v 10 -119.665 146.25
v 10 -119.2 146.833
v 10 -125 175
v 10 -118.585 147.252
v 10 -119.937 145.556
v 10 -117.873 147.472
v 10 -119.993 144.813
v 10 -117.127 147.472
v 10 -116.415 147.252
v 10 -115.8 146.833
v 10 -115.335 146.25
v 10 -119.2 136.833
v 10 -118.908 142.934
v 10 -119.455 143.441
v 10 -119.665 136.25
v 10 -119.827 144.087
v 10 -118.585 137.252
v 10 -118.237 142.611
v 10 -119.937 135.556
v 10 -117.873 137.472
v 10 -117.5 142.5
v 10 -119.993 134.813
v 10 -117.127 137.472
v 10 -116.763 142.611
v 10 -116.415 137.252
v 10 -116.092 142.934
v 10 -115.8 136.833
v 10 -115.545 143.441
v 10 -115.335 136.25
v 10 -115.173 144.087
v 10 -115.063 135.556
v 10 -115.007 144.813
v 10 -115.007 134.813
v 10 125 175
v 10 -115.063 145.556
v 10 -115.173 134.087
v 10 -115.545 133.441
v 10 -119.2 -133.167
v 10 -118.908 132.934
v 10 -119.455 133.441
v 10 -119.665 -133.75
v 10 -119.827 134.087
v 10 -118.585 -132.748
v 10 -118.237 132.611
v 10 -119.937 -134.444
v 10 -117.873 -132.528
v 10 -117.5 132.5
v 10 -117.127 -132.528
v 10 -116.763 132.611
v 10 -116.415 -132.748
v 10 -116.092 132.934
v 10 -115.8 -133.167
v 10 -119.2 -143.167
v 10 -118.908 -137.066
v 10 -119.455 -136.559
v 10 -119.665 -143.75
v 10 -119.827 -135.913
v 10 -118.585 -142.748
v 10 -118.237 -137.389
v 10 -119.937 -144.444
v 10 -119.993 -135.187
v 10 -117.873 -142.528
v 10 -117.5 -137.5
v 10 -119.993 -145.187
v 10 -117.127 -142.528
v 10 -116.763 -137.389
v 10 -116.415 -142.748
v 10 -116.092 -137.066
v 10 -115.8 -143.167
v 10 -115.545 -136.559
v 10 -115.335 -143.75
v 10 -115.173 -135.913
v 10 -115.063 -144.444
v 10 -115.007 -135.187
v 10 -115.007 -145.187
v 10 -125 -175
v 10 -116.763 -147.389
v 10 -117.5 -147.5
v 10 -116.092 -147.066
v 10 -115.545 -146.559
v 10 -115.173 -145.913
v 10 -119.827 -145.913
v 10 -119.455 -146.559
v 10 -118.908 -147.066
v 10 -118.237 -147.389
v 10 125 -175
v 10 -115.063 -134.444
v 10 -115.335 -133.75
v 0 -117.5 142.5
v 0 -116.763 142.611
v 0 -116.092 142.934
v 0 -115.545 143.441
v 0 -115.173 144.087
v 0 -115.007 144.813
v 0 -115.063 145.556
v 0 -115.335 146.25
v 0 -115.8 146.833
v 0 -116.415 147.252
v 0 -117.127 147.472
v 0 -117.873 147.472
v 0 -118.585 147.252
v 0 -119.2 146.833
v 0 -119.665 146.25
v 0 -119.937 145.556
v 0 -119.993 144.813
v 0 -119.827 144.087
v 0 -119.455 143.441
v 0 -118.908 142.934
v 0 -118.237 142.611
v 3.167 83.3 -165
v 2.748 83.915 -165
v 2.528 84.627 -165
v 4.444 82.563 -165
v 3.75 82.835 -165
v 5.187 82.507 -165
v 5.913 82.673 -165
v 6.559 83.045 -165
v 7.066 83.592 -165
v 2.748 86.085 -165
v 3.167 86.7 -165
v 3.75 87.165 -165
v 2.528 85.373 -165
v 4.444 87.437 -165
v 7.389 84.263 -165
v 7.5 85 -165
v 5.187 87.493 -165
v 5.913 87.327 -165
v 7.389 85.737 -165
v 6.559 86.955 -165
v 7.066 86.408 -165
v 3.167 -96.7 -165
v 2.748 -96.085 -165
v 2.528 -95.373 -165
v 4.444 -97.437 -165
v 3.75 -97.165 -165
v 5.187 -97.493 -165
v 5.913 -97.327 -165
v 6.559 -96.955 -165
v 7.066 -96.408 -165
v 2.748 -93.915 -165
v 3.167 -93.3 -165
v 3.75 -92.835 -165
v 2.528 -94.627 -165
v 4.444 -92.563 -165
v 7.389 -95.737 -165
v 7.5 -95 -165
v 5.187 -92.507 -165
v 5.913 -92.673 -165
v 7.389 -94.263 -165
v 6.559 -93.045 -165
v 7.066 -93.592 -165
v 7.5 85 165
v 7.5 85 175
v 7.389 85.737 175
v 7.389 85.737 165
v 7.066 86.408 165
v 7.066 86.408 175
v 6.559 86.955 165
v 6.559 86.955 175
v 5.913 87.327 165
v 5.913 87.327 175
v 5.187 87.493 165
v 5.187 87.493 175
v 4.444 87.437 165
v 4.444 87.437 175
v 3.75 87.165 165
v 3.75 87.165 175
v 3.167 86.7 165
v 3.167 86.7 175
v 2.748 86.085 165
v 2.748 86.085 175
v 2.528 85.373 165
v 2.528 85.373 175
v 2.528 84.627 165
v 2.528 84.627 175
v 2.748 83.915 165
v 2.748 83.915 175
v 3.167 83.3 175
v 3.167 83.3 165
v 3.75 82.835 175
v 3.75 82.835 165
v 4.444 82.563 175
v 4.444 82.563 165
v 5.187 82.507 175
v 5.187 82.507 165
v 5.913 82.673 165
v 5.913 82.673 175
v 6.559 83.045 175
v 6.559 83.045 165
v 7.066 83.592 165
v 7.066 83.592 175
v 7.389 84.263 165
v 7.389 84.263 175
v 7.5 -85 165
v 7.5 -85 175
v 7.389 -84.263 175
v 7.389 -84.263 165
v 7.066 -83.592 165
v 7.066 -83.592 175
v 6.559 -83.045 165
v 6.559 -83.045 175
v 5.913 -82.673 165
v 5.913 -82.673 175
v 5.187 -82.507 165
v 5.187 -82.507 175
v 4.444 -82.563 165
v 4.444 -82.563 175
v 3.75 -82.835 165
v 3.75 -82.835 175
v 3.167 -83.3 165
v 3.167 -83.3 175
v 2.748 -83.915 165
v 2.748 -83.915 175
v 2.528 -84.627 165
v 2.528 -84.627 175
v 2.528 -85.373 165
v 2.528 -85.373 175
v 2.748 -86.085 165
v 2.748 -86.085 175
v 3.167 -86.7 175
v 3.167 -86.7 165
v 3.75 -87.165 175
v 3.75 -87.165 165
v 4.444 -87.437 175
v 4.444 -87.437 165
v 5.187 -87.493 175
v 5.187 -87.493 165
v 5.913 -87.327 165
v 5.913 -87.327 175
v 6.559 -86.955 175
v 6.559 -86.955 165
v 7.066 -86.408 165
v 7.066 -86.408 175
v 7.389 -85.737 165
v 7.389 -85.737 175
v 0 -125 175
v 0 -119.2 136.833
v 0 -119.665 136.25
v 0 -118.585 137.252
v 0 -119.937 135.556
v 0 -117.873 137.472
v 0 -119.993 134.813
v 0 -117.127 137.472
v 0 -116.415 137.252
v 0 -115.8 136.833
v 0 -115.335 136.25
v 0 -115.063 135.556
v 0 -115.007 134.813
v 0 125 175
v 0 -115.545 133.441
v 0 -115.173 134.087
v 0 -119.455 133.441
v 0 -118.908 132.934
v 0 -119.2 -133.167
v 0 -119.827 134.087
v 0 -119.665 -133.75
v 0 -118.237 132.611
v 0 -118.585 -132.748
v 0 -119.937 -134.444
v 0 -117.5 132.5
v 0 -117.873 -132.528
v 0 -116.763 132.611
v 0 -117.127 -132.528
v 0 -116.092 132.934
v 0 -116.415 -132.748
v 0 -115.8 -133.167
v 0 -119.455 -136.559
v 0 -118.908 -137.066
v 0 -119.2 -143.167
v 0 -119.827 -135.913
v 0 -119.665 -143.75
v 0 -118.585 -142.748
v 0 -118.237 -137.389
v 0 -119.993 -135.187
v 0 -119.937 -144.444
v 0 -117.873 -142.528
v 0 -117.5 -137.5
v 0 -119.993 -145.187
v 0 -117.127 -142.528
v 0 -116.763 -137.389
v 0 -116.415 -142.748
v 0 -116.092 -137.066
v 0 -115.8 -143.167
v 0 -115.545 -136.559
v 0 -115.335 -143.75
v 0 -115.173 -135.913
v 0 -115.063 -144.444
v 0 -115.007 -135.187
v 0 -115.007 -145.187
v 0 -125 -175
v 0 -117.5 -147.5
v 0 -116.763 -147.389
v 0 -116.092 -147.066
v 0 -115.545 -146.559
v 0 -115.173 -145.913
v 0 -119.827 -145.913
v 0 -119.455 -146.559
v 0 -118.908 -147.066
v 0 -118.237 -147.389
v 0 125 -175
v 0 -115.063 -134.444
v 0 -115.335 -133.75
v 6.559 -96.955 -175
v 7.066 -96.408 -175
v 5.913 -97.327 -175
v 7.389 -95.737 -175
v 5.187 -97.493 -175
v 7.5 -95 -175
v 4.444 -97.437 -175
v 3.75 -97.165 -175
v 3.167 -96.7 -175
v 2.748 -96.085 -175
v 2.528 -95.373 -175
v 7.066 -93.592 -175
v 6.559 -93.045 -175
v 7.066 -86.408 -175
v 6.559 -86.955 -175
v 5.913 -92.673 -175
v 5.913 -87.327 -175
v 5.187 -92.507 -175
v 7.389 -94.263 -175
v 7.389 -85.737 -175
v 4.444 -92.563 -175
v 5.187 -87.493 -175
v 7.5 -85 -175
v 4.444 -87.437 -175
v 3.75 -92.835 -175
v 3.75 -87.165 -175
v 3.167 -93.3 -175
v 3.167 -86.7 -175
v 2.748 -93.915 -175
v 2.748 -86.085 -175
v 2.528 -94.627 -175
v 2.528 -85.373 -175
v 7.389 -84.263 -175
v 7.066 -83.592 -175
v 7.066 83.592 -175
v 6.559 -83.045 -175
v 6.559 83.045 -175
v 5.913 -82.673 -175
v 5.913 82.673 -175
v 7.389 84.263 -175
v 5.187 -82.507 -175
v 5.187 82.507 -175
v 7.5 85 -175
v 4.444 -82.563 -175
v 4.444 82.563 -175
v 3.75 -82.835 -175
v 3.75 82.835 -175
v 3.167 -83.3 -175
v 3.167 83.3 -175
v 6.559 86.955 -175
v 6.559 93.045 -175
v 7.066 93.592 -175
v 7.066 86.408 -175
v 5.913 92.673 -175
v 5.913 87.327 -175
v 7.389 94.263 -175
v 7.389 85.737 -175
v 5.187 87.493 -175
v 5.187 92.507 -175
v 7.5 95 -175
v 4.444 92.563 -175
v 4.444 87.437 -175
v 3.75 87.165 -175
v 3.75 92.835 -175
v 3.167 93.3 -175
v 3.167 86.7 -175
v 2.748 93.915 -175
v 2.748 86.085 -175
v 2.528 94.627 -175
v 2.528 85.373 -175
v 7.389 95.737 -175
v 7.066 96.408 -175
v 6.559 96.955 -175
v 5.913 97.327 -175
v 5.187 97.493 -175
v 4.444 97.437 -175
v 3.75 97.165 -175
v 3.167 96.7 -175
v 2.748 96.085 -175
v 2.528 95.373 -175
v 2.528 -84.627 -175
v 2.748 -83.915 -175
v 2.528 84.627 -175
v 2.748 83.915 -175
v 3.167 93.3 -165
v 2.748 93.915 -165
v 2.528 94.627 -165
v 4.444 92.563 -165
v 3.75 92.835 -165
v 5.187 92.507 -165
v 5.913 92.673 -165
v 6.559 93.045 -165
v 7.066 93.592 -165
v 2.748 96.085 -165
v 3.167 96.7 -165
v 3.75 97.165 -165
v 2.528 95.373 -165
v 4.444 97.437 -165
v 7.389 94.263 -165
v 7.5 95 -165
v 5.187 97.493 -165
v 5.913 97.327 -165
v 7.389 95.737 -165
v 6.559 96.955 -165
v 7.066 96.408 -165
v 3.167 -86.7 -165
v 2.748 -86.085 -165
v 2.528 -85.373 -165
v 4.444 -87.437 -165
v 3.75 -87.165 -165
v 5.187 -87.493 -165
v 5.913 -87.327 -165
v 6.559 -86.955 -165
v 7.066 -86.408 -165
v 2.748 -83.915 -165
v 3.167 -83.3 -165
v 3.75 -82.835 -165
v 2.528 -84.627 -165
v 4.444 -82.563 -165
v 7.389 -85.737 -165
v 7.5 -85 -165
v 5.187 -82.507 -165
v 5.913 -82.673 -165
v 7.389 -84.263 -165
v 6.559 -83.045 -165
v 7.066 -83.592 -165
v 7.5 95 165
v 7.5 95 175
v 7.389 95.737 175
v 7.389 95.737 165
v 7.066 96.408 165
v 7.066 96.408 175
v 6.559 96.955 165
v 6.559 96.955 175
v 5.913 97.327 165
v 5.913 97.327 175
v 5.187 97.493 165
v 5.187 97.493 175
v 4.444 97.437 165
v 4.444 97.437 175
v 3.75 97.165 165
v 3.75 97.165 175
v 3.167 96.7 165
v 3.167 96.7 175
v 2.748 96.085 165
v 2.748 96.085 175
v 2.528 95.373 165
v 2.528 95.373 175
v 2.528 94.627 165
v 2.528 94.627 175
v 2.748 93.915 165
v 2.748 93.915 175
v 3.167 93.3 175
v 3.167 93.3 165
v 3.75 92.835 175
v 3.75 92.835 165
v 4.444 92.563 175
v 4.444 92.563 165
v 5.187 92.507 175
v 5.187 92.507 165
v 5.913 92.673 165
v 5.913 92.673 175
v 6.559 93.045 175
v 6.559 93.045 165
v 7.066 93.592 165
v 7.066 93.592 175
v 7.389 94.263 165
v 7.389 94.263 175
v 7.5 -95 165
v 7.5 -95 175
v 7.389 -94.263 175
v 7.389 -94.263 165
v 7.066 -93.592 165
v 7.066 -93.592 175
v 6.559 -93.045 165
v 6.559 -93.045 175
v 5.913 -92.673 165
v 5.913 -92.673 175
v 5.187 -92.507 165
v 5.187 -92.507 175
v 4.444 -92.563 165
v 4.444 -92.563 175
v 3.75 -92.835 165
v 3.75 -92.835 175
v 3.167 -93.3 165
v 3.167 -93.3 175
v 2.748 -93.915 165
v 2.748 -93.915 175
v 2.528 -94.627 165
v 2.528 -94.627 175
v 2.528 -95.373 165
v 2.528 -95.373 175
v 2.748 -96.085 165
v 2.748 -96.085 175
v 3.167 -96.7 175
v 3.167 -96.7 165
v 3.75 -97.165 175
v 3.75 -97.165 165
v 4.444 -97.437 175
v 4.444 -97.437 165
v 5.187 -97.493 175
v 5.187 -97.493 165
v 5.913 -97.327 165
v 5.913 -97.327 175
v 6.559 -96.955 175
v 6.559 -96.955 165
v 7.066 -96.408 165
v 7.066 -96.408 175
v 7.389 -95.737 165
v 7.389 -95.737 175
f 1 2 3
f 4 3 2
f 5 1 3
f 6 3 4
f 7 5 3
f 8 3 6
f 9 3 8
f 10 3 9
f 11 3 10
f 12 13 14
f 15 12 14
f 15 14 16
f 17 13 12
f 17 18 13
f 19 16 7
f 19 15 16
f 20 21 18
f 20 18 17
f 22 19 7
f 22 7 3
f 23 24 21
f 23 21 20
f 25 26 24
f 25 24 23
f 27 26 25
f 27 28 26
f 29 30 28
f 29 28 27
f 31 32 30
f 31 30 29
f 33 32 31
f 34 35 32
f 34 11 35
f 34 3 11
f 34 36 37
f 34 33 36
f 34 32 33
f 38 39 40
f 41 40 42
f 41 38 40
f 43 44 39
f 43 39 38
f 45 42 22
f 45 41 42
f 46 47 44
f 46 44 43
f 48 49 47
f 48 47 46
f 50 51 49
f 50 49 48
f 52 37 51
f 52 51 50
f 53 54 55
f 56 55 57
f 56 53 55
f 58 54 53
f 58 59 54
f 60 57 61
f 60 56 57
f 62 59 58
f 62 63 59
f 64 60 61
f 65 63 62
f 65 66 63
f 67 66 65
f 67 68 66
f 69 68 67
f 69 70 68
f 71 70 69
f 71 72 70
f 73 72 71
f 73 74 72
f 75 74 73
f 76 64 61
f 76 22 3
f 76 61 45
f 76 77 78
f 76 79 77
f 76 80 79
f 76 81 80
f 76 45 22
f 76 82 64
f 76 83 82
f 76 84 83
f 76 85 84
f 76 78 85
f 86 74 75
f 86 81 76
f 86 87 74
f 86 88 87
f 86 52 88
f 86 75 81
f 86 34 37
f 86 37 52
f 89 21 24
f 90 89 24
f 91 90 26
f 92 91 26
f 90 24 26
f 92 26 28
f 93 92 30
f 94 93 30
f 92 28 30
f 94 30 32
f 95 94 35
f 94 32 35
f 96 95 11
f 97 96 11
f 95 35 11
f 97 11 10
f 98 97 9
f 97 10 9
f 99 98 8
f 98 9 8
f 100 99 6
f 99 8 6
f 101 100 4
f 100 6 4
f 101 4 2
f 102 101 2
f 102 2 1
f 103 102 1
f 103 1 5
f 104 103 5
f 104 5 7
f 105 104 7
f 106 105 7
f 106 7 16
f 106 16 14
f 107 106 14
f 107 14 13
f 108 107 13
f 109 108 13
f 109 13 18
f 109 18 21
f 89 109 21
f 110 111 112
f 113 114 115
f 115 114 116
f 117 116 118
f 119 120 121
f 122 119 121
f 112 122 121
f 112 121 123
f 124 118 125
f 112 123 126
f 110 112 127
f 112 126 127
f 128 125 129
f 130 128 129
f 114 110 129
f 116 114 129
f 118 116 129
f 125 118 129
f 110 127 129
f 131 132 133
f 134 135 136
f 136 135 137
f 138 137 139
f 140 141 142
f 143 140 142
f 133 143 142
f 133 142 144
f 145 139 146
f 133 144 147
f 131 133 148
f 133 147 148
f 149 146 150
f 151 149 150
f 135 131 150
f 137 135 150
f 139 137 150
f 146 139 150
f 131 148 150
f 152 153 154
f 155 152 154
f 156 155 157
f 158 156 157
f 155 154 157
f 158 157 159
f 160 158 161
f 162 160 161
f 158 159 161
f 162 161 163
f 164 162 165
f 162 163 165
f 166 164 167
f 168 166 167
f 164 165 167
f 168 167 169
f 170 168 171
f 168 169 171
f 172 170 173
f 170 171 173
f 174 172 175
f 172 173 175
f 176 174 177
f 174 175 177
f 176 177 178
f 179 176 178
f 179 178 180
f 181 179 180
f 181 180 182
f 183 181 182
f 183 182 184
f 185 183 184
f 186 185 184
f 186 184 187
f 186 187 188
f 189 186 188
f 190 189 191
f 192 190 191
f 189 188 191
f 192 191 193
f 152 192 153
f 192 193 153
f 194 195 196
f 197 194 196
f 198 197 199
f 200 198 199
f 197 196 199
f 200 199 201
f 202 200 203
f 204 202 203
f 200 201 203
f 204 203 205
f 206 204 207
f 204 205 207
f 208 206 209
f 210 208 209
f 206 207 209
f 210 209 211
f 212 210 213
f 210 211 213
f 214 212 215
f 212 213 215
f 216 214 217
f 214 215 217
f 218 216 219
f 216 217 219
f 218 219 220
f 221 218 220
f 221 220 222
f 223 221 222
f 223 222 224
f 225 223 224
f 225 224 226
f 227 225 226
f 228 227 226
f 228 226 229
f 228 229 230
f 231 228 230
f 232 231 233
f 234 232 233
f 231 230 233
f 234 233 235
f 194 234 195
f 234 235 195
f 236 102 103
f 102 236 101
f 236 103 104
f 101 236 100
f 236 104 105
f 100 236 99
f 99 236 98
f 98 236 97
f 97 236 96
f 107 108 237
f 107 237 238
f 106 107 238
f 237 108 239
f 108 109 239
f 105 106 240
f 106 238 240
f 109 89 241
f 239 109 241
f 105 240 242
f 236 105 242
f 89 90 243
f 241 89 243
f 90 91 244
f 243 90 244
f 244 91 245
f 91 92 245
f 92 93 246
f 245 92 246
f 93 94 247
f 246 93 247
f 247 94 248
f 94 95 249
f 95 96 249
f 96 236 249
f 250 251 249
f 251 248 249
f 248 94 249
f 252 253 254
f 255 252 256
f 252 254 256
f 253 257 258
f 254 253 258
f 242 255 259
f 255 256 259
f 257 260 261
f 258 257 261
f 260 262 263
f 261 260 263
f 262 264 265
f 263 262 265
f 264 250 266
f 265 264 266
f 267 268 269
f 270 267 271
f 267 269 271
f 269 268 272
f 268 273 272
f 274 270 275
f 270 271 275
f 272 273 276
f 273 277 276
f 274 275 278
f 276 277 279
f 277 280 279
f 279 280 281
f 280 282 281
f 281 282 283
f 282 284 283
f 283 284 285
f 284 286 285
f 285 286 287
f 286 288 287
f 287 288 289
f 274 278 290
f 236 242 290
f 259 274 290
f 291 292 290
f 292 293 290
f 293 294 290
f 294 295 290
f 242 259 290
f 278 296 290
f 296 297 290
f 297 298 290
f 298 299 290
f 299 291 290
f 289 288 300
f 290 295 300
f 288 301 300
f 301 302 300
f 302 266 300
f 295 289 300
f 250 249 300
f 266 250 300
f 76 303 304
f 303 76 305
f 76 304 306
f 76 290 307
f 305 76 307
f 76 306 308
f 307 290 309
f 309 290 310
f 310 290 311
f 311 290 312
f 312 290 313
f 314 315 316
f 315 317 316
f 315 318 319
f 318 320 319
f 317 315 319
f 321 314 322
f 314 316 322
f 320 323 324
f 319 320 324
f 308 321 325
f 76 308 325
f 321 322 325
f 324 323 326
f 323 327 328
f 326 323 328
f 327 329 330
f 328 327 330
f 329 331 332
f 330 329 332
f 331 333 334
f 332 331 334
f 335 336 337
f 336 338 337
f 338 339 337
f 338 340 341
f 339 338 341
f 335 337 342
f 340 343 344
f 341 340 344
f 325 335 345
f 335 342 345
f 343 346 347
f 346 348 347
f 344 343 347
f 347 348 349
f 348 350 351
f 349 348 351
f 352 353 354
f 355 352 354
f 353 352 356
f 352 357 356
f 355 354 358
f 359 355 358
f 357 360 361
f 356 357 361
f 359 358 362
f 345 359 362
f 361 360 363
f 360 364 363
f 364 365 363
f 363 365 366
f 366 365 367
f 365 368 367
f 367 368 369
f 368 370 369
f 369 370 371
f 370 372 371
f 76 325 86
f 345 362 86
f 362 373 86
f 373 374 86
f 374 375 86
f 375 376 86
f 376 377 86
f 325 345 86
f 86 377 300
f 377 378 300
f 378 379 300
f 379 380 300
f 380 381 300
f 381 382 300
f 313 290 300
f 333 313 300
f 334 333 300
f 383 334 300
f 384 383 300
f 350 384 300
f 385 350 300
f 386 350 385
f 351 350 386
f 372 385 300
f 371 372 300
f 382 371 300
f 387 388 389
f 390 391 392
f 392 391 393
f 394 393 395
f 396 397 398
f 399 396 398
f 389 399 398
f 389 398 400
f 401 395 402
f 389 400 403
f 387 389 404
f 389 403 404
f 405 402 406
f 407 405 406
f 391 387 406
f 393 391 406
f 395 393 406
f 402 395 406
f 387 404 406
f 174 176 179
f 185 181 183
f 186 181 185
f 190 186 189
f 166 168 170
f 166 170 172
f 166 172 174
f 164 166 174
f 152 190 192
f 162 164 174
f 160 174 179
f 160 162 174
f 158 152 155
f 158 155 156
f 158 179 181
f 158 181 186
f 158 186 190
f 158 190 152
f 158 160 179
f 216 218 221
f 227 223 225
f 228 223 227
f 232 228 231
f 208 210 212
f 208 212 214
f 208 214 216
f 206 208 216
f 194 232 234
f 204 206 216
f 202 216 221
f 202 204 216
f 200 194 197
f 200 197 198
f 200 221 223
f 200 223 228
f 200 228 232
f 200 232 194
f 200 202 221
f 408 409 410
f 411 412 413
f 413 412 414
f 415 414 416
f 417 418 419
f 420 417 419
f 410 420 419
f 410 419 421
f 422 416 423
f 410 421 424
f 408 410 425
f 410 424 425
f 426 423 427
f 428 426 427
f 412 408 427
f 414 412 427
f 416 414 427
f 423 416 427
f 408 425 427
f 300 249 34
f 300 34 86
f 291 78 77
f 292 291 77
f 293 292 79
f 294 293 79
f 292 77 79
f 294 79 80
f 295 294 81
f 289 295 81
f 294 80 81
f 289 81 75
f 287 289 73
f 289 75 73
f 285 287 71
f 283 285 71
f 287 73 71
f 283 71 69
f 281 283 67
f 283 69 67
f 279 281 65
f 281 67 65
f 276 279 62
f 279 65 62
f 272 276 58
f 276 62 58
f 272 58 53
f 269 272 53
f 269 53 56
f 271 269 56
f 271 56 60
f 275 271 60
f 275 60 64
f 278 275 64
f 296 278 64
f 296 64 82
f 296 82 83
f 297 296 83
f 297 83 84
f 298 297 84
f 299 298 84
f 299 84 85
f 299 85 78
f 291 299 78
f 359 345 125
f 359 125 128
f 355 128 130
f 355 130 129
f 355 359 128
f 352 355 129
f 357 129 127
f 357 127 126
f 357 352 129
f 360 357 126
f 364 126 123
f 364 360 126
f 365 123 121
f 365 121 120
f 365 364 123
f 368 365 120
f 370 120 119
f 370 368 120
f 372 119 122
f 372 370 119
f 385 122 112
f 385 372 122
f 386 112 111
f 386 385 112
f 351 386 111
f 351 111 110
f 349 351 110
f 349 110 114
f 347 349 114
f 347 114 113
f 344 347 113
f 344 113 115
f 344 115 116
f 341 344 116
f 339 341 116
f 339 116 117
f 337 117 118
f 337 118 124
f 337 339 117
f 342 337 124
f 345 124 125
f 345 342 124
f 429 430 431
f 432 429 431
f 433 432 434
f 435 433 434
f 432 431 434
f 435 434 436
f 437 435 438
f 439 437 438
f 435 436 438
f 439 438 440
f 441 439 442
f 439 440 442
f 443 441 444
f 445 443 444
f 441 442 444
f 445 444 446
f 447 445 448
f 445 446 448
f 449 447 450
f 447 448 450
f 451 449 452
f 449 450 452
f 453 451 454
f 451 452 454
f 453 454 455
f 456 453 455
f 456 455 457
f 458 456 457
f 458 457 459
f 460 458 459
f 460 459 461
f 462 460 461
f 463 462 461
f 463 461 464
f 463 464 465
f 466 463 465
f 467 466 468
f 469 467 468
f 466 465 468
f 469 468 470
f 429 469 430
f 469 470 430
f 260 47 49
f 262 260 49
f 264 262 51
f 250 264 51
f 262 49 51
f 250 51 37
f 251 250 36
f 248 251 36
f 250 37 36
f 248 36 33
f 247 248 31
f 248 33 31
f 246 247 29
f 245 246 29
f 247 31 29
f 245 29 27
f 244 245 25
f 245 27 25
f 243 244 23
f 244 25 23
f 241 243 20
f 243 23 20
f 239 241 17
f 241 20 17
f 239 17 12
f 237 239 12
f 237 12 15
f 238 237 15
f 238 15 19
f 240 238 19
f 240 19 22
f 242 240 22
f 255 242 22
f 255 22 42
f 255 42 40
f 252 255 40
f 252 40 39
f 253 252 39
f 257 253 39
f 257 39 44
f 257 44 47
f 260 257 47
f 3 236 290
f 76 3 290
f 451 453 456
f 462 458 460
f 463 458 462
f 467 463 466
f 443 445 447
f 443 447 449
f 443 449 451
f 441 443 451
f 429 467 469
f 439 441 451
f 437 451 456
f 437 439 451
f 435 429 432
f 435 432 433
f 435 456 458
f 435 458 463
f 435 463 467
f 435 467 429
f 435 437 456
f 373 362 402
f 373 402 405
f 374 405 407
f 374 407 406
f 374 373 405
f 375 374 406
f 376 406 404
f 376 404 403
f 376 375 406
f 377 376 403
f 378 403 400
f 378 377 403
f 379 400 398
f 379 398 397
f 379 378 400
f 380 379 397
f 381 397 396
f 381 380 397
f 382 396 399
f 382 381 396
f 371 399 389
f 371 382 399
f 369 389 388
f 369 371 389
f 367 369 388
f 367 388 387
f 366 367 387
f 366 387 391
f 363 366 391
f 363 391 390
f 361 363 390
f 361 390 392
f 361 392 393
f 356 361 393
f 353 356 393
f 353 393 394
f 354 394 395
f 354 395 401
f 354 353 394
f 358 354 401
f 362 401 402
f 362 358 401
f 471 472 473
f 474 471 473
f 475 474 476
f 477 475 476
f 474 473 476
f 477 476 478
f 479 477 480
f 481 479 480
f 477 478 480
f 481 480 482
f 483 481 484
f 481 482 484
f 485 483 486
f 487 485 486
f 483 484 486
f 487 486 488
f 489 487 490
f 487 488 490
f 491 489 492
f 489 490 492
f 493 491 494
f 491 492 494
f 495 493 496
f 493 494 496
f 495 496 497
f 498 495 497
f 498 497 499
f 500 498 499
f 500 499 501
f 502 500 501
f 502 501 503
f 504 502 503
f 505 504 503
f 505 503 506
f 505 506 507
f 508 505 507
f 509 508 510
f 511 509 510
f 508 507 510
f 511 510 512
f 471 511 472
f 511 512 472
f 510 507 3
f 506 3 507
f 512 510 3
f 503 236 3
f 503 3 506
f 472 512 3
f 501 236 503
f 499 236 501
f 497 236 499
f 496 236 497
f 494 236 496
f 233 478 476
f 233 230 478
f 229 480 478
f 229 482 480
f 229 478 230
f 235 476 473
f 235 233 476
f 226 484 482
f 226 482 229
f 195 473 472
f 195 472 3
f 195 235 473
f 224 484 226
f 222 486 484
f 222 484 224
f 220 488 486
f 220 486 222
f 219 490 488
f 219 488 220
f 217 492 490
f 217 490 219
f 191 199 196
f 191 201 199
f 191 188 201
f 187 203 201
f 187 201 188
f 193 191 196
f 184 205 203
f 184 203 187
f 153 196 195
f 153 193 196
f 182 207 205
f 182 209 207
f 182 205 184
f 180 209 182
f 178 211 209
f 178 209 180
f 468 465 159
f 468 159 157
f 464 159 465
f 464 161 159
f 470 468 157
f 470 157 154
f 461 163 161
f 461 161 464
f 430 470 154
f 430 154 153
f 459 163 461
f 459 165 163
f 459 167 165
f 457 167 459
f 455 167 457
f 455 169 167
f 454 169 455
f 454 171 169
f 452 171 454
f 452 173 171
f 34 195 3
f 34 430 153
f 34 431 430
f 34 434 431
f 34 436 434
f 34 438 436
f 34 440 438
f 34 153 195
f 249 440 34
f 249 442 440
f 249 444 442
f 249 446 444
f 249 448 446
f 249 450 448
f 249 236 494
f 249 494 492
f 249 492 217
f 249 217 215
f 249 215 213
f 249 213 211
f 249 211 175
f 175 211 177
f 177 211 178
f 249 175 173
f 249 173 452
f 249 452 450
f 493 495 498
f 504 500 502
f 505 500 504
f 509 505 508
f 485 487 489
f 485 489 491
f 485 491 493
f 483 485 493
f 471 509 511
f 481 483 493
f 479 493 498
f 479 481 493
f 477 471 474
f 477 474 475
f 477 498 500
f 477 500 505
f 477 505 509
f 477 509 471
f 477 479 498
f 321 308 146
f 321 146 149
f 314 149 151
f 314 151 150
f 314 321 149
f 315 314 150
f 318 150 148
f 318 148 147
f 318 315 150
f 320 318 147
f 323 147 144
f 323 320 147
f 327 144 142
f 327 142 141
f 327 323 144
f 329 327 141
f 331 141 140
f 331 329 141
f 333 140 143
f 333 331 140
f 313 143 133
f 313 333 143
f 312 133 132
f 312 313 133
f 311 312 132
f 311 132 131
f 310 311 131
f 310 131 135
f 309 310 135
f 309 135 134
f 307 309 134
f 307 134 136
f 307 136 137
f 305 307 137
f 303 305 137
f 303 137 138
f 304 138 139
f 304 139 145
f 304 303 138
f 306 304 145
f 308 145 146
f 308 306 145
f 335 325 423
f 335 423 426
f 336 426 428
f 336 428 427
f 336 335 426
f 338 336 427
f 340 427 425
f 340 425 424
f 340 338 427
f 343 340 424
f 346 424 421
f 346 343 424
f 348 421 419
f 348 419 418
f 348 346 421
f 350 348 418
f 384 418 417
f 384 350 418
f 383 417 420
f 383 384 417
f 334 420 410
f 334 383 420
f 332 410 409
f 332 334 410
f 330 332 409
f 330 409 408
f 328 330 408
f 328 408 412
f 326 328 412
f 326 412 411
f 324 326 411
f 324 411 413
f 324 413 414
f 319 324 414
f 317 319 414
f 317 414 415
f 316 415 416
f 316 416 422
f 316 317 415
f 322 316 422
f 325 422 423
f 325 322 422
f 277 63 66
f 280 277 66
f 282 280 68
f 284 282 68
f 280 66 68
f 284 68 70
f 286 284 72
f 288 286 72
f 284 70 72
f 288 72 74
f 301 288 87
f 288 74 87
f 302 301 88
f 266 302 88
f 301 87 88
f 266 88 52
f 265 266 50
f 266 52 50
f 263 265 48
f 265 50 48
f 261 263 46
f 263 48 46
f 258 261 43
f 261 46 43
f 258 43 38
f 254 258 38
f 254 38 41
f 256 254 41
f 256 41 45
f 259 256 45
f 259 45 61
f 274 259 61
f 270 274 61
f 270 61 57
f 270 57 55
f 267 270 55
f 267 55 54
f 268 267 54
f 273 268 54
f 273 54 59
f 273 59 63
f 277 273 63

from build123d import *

# Parameters (mm, degrees)
SKETCH1_W           = 350
SKETCH1_H           = 250
BOSS_EXTRUDE1_DEPTH = 10
SKETCH2_R           = 2.5
CUT_EXTRUDE1_DEPTH  = 10
SKETCH3_R           = 2.5
CUT_EXTRUDE2_DEPTH  = 216.290501416


with BuildPart() as part:
    # Sketch1 → Boss-Extrude1 (new body)
    with BuildSketch(Plane(origin=(0, 0, 0), x_dir=(0, 0, -1), z_dir=(1, 0, 0))):
        Rectangle(SKETCH1_W, SKETCH1_H)
    extrude(amount=BOSS_EXTRUDE1_DEPTH)

    # Sketch2 → Cut-Extrude1 (cut)
    with BuildSketch(Plane.XY.offset(175)):
        with Locations((5, 95)):
            Circle(SKETCH2_R)
        with Locations((5, 85)):
            Circle(SKETCH2_R)
        with Locations((5, -85)):
            Circle(SKETCH2_R)
        with Locations((5, -95)):
            Circle(SKETCH2_R)
    cut_extrude1 = extrude(amount=-CUT_EXTRUDE1_DEPTH, mode=Mode.SUBTRACT)

    # Mirror1: Cut-Extrude1 across plane
    add(cut_extrude1.mirror(Plane.XY), mode=Mode.SUBTRACT)

    # Sketch3 → Cut-Extrude2 (cut, through all)
    with BuildSketch(Plane(origin=(10, 0, 0), x_dir=(0, 0, -1), z_dir=(1, 0, 0))):
        with Locations((-145, -117.5)):
            Circle(SKETCH3_R)
        with Locations((-135, -117.5)):
            Circle(SKETCH3_R)
        with Locations((135, -117.5)):
            Circle(SKETCH3_R)
        with Locations((145, -117.5)):
            Circle(SKETCH3_R)
    extrude(amount=-CUT_EXTRUDE2_DEPTH, mode=Mode.SUBTRACT)


solid = part.part
